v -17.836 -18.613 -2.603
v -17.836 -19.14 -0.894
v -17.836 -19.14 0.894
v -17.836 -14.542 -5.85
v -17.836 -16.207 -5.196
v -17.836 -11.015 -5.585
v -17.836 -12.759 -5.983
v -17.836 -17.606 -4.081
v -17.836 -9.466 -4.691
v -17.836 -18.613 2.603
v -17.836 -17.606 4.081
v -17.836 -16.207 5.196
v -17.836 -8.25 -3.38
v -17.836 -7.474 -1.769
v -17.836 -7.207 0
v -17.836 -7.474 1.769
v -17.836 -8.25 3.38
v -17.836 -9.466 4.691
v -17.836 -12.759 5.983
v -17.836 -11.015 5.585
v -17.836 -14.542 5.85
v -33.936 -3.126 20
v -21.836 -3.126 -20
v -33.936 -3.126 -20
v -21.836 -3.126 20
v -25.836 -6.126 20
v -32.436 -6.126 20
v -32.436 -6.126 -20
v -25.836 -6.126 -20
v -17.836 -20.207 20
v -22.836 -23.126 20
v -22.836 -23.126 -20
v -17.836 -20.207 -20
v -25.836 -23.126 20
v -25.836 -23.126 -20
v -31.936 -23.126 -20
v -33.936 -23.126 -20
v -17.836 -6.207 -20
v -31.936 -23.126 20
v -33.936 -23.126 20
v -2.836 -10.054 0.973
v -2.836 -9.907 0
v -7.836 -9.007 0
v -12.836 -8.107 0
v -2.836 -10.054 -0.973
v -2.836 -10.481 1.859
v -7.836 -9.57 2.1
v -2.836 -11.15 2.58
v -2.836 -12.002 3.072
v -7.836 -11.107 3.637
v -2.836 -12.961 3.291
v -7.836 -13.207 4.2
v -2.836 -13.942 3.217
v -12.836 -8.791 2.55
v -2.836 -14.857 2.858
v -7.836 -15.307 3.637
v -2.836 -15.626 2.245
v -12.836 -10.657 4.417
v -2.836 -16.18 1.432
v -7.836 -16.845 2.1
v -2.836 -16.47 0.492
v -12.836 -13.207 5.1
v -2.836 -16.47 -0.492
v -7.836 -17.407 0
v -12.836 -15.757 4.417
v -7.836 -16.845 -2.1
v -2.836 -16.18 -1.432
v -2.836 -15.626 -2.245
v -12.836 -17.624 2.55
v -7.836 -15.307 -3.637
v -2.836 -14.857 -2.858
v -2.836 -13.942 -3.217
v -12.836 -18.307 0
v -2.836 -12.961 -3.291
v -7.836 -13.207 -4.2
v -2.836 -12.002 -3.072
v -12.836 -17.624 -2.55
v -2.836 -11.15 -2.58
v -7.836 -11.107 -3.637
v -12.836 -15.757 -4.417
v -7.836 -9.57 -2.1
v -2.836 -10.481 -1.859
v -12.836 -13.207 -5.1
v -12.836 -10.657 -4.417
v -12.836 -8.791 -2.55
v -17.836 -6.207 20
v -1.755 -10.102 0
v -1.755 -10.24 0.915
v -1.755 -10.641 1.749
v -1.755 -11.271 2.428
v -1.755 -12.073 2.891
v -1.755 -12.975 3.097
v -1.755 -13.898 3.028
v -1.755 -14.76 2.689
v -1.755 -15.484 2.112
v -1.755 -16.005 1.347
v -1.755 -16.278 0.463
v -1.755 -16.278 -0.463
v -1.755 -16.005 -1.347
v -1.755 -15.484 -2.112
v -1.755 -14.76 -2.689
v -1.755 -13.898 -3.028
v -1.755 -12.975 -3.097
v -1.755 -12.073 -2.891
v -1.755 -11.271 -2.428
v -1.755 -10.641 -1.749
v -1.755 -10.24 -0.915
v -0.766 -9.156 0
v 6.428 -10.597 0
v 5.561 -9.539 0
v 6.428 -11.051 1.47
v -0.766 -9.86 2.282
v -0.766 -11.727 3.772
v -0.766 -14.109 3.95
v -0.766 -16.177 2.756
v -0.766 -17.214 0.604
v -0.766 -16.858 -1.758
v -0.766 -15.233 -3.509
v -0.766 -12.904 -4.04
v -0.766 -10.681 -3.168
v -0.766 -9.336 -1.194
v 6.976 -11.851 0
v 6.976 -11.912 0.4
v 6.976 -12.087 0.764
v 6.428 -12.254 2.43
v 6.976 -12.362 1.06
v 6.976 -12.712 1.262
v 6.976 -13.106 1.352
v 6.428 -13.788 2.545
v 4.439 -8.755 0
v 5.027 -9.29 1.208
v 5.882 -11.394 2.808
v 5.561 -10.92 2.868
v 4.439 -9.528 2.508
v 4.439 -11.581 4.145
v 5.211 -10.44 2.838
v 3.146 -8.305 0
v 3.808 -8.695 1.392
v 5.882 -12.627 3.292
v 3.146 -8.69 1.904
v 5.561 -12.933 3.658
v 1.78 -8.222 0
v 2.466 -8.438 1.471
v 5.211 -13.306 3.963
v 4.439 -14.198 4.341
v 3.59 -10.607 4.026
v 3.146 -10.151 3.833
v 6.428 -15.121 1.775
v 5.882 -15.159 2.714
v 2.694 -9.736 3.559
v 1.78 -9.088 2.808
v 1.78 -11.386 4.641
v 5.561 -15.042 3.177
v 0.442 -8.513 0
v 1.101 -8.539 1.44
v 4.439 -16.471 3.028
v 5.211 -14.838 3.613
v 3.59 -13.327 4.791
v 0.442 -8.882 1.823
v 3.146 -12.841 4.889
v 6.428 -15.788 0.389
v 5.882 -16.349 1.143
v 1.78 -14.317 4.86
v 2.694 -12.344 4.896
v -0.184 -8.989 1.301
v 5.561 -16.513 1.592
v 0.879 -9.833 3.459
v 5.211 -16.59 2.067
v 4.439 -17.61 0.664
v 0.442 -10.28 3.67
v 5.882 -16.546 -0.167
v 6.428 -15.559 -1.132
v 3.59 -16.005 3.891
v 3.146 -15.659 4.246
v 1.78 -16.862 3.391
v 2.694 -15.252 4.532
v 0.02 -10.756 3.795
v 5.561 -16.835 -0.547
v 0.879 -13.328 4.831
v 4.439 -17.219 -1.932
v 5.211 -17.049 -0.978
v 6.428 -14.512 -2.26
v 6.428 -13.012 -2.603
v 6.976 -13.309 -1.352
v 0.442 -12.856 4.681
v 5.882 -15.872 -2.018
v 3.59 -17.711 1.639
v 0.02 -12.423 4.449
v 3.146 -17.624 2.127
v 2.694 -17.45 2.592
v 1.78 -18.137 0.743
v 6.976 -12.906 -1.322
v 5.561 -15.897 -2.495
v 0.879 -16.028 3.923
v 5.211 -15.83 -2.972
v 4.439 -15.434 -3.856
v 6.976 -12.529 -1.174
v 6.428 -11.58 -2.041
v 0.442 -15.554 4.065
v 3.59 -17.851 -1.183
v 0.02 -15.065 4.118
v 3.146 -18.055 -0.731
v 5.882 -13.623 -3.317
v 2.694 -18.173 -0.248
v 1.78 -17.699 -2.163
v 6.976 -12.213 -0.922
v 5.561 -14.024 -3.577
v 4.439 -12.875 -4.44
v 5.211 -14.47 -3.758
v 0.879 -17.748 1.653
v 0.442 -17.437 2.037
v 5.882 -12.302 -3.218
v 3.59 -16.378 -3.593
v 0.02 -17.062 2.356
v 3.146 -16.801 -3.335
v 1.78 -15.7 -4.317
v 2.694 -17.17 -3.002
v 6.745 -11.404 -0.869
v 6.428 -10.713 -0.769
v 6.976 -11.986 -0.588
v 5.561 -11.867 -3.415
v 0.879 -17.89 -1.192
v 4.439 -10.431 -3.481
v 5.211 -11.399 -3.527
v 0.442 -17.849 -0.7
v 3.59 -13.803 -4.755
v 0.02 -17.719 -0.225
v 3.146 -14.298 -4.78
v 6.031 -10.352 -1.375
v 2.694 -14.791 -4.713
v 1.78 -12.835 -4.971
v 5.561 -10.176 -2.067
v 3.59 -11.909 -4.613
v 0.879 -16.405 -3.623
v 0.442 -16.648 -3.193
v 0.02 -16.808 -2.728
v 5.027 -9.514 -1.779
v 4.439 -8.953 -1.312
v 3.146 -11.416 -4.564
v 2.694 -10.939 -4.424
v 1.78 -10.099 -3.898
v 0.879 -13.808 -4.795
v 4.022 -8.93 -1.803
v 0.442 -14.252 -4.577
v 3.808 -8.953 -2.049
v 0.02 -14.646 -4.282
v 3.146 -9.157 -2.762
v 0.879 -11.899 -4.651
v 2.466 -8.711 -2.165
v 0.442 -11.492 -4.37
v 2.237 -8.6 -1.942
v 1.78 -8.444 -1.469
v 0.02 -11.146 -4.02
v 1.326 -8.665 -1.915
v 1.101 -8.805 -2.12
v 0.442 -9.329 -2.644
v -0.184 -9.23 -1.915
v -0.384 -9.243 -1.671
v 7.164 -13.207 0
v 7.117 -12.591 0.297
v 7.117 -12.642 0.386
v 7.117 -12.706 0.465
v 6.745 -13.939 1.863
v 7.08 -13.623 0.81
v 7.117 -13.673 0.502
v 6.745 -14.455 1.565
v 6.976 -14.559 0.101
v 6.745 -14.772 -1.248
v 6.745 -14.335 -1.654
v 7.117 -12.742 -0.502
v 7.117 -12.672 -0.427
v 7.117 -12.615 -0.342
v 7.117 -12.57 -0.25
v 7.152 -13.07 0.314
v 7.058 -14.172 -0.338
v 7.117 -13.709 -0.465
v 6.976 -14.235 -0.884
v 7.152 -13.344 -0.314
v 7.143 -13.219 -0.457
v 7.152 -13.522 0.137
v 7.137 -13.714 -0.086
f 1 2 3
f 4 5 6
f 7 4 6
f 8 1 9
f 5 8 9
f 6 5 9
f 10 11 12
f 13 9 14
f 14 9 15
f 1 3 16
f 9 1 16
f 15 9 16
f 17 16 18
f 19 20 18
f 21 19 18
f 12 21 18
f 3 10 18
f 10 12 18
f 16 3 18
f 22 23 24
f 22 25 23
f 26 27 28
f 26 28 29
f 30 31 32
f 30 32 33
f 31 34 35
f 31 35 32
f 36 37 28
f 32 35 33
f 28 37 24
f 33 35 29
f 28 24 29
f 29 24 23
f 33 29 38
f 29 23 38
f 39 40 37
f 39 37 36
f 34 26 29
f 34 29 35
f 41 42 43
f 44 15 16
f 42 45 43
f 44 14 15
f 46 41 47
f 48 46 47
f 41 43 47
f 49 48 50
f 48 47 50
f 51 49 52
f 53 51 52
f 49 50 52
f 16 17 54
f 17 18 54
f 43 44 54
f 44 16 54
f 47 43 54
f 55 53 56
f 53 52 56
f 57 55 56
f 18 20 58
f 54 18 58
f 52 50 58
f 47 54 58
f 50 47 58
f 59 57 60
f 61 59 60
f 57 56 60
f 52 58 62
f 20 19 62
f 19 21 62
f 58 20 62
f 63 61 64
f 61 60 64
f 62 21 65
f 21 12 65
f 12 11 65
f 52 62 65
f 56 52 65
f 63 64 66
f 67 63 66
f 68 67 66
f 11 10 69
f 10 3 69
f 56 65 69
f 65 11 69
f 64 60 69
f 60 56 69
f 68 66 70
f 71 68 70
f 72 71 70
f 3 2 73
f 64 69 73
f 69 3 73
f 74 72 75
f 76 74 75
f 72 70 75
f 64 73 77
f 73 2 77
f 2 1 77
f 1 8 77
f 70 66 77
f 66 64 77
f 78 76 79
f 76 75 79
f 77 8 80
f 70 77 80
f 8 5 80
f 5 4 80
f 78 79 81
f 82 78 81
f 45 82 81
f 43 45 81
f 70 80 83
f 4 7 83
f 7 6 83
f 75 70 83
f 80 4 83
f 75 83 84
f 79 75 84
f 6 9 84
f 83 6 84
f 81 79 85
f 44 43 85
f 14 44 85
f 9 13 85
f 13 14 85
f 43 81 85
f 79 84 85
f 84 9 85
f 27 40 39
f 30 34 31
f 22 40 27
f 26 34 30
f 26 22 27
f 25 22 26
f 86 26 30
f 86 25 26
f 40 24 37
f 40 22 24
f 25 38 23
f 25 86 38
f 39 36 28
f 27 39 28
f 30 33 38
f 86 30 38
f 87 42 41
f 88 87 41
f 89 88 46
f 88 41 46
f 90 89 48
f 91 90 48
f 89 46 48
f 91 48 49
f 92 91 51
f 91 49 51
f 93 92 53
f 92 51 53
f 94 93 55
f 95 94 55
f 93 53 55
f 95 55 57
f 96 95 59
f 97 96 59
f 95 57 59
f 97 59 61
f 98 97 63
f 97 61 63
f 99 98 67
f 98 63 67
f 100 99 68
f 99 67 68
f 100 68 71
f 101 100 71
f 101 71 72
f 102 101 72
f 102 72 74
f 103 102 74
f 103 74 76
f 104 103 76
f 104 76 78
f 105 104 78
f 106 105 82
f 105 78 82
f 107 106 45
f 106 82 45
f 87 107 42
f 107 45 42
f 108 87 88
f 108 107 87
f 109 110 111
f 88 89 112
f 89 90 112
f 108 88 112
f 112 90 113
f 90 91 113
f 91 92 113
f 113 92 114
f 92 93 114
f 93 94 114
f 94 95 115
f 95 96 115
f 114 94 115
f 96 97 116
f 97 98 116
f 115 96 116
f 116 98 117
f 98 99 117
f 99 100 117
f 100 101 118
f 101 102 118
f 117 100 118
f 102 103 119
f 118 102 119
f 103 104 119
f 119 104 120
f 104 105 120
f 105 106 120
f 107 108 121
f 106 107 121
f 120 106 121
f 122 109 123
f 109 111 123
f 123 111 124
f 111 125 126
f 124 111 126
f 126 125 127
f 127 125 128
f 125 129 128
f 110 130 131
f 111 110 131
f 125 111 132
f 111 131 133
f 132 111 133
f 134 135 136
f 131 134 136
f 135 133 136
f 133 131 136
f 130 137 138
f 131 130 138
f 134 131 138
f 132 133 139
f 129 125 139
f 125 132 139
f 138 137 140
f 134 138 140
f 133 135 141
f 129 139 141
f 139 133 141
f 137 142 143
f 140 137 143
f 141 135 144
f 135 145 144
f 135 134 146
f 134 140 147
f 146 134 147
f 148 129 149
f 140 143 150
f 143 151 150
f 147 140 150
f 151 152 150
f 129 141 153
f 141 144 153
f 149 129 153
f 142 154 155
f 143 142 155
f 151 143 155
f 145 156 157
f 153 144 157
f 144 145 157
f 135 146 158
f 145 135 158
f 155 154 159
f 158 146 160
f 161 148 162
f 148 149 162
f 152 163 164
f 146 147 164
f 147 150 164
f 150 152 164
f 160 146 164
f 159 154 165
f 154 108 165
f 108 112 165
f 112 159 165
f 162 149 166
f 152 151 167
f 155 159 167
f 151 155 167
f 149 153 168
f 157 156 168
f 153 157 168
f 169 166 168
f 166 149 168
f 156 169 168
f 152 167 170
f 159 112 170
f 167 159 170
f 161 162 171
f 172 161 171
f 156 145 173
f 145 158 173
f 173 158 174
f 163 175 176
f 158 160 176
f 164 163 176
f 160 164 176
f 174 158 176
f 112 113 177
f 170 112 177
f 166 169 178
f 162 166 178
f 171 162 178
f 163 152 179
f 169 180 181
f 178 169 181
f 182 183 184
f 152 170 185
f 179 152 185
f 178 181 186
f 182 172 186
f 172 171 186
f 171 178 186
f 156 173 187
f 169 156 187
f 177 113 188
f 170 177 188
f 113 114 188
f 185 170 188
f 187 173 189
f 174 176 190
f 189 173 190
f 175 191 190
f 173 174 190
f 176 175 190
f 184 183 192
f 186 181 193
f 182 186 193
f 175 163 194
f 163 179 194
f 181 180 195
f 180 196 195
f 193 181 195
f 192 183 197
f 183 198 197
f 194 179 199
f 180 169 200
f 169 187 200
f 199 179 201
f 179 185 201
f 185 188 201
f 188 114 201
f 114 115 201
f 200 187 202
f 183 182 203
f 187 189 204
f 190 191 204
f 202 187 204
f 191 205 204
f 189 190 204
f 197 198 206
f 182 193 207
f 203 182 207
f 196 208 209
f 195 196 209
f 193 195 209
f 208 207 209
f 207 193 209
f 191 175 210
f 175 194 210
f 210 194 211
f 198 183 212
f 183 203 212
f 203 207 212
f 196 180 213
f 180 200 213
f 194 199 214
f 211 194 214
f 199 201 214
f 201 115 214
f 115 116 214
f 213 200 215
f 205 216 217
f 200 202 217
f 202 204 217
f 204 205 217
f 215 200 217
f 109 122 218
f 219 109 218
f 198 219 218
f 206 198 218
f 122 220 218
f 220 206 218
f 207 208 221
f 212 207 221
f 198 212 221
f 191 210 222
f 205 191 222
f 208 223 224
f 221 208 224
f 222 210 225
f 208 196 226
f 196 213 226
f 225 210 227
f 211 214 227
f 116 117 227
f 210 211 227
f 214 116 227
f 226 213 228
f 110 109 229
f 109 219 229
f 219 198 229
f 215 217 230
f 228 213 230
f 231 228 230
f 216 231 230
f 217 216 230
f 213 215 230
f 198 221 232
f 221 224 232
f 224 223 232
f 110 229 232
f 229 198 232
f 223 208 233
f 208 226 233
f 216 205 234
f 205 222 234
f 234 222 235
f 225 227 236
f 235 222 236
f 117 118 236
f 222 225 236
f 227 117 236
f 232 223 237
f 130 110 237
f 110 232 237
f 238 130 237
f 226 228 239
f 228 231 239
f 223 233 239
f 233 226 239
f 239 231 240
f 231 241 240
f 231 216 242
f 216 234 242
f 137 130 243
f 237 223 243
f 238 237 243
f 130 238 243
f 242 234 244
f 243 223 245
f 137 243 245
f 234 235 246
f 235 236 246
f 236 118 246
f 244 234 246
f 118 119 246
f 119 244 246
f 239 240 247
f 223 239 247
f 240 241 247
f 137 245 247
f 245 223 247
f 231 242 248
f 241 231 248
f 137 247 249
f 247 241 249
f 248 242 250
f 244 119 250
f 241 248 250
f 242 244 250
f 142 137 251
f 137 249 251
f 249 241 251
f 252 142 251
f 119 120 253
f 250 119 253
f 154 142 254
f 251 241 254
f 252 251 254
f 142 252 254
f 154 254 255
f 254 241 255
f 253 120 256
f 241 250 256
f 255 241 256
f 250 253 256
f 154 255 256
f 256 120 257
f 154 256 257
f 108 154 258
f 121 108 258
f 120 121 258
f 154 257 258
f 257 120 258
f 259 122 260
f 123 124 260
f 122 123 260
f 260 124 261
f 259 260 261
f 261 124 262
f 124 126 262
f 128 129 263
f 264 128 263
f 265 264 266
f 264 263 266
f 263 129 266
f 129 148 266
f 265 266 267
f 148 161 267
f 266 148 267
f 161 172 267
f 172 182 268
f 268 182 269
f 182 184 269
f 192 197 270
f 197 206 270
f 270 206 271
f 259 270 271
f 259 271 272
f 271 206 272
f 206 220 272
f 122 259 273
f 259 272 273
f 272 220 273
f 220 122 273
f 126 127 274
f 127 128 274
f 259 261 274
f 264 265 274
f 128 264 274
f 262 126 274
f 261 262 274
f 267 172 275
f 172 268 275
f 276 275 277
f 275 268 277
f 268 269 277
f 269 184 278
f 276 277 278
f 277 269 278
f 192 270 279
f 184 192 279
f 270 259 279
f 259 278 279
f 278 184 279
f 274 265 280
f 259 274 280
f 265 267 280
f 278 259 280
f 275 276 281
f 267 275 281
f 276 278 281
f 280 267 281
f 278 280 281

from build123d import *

# Parameters (mm, degrees)
F1_DEPTH = 20


with BuildPart() as f1:
    # F0 (on Top) → F1 (new body, symmetric)
    with BuildSketch(Plane.XY):
        Polygon((-33.935995, -3.126303), (-33.935995, -23.126303), (-31.935995, -23.126303), (-32.435995, -6.126303), (-25.835995, -6.126303), (-25.835995, -23.126303), (-22.835995, -23.126303), (-17.836405, -20.207281), (-17.836405, -19.207281), (-17.836405, -13.207281), (-17.836405, -7.207281), (-17.836405, -6.207281), (-21.835995, -3.126303), align=None)
    extrude(amount=F1_DEPTH, both=True)


with BuildPart() as f2:
    # F0 (on Top) → F2 (revolve)
    with BuildSketch(Plane.XY):
        with BuildLine():
            Line((-2.836405, -9.907281), (-17.836405, -7.207281))
            Line((-17.836405, -7.207281), (-17.836405, -13.207281))
            Line((-17.836405, -13.207281), (-2.836405, -13.207281))
            ThreePointArc((-2.836405, -13.207281), (-2.558363, -11.563166), (-1.75516, -10.101905))
            Line((-1.75516, -10.101905), (-2.836405, -9.907281))
        make_face()
    revolve(axis=Axis((-10.336405, -13.207281, 0), (1, 0, 0)))

    # F0 (on Top) → F3 (revolve)
    with BuildSketch(Plane.XY):
        with BuildLine():
            ThreePointArc((-1.75516, -10.101905), (-2.558363, -11.563166), (-2.836405, -13.207281))
            Line((-2.836405, -13.207281), (7.163595, -13.207281))
            ThreePointArc((7.163595, -13.207281), (3.807709, -8.485323), (-1.75516, -10.101905))
        make_face()
    revolve(axis=Axis((2.163595, -13.207281, 0), (1, 0, 0)))


solid = Compound([f1.part, f2.part])
